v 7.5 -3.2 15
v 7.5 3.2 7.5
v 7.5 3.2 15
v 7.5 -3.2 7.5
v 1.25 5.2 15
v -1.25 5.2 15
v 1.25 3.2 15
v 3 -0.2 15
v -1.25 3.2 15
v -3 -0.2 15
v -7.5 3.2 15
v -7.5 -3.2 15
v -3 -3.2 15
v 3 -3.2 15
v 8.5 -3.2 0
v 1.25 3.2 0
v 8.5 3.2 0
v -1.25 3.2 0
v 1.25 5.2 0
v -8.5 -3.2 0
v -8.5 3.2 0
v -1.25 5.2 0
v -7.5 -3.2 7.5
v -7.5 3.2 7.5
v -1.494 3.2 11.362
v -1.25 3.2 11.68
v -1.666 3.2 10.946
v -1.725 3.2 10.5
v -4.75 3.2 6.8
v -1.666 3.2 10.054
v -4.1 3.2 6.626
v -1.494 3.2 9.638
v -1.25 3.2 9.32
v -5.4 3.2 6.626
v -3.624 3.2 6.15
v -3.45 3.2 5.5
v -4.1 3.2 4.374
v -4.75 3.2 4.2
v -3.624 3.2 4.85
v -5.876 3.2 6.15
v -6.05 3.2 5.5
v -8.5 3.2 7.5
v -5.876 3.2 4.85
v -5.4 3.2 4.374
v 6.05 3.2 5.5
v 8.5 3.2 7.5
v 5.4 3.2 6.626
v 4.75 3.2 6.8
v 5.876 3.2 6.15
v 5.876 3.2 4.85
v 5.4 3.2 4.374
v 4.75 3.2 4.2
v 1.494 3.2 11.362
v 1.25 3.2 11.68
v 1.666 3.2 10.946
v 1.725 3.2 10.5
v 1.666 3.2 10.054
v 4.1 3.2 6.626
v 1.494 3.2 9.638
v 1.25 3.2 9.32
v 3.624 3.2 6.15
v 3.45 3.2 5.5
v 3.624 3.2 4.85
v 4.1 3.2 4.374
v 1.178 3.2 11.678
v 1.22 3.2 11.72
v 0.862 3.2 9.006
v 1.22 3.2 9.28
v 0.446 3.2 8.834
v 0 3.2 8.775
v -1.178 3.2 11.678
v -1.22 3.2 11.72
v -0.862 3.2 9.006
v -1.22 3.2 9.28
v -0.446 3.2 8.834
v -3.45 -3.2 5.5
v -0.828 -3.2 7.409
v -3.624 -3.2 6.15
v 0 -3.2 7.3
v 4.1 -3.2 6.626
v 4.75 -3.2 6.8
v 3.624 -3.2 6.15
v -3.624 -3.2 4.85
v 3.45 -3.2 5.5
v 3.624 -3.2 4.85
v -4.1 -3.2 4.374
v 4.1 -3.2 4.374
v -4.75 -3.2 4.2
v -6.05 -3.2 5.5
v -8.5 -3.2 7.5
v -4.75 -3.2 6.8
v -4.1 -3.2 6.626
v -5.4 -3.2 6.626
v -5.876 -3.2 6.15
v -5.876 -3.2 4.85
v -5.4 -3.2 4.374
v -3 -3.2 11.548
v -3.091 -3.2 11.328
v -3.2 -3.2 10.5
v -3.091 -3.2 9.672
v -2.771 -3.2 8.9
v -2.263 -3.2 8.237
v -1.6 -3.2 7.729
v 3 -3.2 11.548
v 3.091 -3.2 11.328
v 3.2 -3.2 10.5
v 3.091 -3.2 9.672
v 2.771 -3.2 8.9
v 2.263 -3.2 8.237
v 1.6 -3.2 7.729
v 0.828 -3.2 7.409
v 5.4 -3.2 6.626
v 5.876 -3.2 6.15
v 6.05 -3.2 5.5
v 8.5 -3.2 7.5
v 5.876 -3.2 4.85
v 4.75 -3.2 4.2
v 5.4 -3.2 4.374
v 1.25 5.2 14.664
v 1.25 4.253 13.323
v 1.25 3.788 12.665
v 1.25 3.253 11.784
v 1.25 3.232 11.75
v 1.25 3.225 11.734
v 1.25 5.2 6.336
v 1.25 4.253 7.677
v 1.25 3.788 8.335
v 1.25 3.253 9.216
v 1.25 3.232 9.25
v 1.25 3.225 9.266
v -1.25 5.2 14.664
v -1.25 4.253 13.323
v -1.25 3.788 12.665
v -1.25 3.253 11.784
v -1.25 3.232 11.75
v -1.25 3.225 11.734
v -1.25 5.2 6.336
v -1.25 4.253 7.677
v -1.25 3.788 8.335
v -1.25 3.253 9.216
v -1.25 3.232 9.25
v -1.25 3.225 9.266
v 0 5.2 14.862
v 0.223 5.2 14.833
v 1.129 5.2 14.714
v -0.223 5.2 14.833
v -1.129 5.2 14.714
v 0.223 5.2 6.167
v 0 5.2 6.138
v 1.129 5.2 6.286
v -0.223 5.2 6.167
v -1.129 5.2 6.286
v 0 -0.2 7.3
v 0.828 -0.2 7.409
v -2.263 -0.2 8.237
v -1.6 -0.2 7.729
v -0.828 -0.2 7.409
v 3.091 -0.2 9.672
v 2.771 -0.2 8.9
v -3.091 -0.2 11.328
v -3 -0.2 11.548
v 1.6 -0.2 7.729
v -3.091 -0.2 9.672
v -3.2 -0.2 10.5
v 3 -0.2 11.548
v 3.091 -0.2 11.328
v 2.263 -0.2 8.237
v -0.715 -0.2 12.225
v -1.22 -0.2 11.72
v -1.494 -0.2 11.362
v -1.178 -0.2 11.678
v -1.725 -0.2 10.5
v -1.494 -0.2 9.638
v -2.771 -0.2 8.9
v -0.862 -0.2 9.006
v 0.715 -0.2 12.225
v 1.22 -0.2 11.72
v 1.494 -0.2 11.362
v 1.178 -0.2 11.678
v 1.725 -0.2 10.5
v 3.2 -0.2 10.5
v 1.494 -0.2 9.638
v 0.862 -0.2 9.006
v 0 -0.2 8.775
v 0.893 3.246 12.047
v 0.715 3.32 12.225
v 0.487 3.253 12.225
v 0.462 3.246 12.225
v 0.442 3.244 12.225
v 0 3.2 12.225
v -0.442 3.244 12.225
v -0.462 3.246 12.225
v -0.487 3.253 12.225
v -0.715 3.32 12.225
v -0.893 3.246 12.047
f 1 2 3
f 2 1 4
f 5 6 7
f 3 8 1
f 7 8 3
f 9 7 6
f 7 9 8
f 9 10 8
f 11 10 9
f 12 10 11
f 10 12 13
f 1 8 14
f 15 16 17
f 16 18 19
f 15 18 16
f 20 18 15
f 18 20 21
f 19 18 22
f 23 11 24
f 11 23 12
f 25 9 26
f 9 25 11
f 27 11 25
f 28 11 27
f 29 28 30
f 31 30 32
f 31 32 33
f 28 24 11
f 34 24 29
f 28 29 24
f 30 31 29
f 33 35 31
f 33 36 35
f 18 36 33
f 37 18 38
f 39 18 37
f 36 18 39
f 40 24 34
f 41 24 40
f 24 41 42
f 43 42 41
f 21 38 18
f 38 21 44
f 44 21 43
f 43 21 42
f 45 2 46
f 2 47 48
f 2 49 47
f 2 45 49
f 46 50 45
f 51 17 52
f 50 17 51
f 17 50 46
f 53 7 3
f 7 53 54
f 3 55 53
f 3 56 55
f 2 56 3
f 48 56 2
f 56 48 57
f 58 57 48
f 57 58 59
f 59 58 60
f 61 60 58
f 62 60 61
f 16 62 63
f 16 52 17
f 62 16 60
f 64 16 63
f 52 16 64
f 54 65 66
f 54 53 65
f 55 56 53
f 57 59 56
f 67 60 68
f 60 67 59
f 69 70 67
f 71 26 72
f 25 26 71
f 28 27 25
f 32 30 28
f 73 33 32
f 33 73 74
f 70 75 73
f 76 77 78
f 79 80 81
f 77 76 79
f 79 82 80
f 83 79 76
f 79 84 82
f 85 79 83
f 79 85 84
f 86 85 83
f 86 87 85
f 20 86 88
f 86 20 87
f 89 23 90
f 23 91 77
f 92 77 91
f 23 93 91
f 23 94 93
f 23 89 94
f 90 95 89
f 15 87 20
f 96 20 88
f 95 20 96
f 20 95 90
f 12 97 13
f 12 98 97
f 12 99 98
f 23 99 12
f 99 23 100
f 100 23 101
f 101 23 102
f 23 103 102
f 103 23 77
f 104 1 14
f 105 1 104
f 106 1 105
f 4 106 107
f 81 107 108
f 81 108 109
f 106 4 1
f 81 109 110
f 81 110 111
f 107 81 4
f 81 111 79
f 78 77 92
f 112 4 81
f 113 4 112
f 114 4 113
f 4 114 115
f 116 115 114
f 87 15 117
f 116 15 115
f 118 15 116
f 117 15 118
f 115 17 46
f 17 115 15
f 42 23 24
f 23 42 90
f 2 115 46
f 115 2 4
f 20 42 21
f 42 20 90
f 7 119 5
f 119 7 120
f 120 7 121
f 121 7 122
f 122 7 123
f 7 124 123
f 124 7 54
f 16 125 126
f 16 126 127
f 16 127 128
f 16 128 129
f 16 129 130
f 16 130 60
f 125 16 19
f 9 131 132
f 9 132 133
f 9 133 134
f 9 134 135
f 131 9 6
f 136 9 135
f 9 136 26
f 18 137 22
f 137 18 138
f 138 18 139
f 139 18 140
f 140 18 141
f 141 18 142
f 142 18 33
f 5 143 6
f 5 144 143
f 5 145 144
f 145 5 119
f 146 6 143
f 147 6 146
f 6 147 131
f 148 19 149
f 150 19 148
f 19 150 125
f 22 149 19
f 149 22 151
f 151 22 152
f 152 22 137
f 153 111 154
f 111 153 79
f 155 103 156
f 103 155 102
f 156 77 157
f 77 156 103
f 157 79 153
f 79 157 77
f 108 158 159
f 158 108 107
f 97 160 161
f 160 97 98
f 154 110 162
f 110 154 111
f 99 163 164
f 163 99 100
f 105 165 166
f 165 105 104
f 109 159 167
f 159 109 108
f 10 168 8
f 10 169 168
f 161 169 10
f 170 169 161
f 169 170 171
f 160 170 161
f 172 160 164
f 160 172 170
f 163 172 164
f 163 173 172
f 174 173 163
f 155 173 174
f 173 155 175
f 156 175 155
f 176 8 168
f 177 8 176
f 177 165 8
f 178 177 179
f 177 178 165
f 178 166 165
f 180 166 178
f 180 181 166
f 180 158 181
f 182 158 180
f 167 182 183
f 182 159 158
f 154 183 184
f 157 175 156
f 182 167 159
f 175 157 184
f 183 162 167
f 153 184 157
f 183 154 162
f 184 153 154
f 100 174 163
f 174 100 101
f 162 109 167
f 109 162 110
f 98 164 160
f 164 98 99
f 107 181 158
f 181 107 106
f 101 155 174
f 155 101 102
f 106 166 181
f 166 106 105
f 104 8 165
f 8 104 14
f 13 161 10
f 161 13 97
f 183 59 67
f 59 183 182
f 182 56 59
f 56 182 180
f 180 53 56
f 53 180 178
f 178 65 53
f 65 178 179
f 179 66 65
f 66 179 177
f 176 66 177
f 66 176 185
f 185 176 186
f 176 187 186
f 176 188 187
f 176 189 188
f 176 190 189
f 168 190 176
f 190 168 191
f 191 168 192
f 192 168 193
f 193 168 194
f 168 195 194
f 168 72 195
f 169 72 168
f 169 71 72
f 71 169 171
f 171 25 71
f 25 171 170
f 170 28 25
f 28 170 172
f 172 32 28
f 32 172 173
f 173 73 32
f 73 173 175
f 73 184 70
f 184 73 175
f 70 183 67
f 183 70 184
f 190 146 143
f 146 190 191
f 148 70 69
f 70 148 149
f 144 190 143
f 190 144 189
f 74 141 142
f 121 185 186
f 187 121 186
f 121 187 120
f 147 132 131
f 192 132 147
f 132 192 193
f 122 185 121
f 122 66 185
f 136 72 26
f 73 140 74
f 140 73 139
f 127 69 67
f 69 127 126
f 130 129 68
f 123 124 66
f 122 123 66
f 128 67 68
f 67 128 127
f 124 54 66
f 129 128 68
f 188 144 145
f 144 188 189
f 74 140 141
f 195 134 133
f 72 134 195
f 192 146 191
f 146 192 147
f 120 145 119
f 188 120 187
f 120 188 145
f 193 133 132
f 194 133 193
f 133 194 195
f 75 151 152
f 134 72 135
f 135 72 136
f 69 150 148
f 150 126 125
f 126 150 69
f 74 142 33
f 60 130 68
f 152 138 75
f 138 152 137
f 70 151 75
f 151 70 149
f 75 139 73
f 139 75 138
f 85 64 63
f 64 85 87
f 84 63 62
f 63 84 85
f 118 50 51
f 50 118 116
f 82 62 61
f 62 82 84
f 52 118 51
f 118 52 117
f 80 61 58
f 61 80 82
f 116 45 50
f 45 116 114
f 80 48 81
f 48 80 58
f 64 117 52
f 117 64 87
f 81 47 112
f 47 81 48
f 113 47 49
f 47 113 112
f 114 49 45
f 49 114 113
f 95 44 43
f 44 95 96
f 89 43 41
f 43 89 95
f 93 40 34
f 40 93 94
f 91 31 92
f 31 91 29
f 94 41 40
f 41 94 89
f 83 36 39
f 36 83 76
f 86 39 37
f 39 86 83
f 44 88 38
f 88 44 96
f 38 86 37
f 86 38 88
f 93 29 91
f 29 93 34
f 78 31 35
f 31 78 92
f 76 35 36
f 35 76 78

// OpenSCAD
// file: ../microswitch.scad
// Don't print this file, purchase real micro switches
// (Honeywell ZM10B10A01 or similar).

module microswitch() {
  difference() {
    union() {
      translate([0, 0, 2.5])
        cube([19.8, 6, 10], center=true);
      translate([2.5, 0.5, 6])
        cube([2, 3.5, 5], center=true);
      for (x = [-8, -1, 8]) {
        translate([x, 0, 0])
          cube([0.6, 3.2, 13], center=true);
      }
    }
    for (x = [-9.5/2, 9.5/2]) {
      translate([x, 0, 0]) rotate([90, 0, 0])
        cylinder(r=2.5/2, h=20, center=true, $fn=12);
    }
  }
}

microswitch();
// file: ../teardrop.scad
///////////////////////////////////////////////////////////////////////////////////////////
// The teardrop functions below are from "teardrop.scad" by nophead's Mendel90 design
//
// Mendel90
//
// GNU GPL v2
// nop.head@gmail.com
// hydraraptor.blogspot.com
//
// For making horizontal holes that don't need support material
// Small holes can get away without it but they print better with truncated teardrops
//
module teardrop_2D(r, truncate = true) {
    difference() {
        union() {
            circle(r = r, center = true);
            translate([0,r / sqrt(2),0])
                rotate([0,0,45])
                    square([r, r], center = true);
        }
        if(truncate)
            translate([0, r * 2, 0])
                square([2 * r, 2 * r], center = true);
    }
}

module teardrop(h, r, center, truncate = true)
    linear_extrude(height = h, convexity = 2, center = center)
        teardrop_2D(r, truncate);

module teardrop_plus(h, r, center, truncate = true)
    teardrop(h, r + layer_height / 4, center, truncate);


module tearslot(h, r, w, center)
    linear_extrude(height = h, convexity = 6, center = center)
        hull() {
            translate([-w/2,0,0]) teardrop_2D(r, true);
            translate([ w/2,0,0]) teardrop_2D(r, true);
        }

module vertical_tearslot(h, r, l, center = true)
    linear_extrude(height = h, convexity = 6, center = center)
        hull() {
            translate([0, l / 2]) teardrop_2D(r, true);
            translate([0, -l / 2, 0])
                circle(r = r, center = true);
        }

//////////////////////////////////////////////////////////////////////////////////////
// file: ../configuration.scad
// Increase this if your slicer or printer make holes too tight.
extra_radius = 0.1;

// OD = outside diameter, corner to corner.
m3_nut_od = 6.1;
m3_nut_radius = m3_nut_od/2 + 0.2 + extra_radius;

// Major diameter of metric 3mm thread.
m3_major = 2.85;
m3_radius = m3_major/2 + extra_radius;
m3_wide_radius = m3_major/2 + extra_radius + 0.2;

// NEMA17 stepper motors.
motor_shaft_diameter = 5;
motor_shaft_radius = motor_shaft_diameter/2 + extra_radius;

// Frame brackets.
thickness = 3.6;
// main file
include <../configuration.scad>;
include <../teardrop.scad>

use <../microswitch.scad>;

thickness = 6.4;  // thinner endstop required for the delrin V roller version
width = 15;  // Same as vertical extrusion.
height = 15;

module endstop() {
  difference() {
    union() {
      cube([width, thickness, height], center=true);
      translate([0, 0, -height/4])
        cube([width+2, thickness, height/2], center=true);
      translate([0, 2, 0])
        cube([2.5, thickness, height], center=true);
    }
    translate([0, 0, 3]) rotate([90, 0, 0]) {
      teardrop(r=m3_wide_radius, h=20, center=true, $fn=12,truncate=true);
      translate([0, 0, 3.6-thickness/2-0.2]) {
        teardrop(r=3.2, h=10, $fn=24,truncate=true);
        translate([0, 5, 5])
          cube([6, 10, 10], center=true);
      }
      translate([0, 0, -thickness/2]) scale([1, 1, -1])
        cylinder(r1=m3_wide_radius, r2=7, h=4, $fn=24);
    }
    translate([0, -3-thickness/2, -2]) rotate([0, 180, 0]) {
      % microswitch();
      for (x = [-9.5/2, 9.5/2]) {
        translate([x, 0, 0]) rotate([90, 0, 0])
          cylinder(r=2.6/2, h=40, center=true, $fn=12);
      }
    }
  }
}

translate([0, 0, height/2]) endstop();
